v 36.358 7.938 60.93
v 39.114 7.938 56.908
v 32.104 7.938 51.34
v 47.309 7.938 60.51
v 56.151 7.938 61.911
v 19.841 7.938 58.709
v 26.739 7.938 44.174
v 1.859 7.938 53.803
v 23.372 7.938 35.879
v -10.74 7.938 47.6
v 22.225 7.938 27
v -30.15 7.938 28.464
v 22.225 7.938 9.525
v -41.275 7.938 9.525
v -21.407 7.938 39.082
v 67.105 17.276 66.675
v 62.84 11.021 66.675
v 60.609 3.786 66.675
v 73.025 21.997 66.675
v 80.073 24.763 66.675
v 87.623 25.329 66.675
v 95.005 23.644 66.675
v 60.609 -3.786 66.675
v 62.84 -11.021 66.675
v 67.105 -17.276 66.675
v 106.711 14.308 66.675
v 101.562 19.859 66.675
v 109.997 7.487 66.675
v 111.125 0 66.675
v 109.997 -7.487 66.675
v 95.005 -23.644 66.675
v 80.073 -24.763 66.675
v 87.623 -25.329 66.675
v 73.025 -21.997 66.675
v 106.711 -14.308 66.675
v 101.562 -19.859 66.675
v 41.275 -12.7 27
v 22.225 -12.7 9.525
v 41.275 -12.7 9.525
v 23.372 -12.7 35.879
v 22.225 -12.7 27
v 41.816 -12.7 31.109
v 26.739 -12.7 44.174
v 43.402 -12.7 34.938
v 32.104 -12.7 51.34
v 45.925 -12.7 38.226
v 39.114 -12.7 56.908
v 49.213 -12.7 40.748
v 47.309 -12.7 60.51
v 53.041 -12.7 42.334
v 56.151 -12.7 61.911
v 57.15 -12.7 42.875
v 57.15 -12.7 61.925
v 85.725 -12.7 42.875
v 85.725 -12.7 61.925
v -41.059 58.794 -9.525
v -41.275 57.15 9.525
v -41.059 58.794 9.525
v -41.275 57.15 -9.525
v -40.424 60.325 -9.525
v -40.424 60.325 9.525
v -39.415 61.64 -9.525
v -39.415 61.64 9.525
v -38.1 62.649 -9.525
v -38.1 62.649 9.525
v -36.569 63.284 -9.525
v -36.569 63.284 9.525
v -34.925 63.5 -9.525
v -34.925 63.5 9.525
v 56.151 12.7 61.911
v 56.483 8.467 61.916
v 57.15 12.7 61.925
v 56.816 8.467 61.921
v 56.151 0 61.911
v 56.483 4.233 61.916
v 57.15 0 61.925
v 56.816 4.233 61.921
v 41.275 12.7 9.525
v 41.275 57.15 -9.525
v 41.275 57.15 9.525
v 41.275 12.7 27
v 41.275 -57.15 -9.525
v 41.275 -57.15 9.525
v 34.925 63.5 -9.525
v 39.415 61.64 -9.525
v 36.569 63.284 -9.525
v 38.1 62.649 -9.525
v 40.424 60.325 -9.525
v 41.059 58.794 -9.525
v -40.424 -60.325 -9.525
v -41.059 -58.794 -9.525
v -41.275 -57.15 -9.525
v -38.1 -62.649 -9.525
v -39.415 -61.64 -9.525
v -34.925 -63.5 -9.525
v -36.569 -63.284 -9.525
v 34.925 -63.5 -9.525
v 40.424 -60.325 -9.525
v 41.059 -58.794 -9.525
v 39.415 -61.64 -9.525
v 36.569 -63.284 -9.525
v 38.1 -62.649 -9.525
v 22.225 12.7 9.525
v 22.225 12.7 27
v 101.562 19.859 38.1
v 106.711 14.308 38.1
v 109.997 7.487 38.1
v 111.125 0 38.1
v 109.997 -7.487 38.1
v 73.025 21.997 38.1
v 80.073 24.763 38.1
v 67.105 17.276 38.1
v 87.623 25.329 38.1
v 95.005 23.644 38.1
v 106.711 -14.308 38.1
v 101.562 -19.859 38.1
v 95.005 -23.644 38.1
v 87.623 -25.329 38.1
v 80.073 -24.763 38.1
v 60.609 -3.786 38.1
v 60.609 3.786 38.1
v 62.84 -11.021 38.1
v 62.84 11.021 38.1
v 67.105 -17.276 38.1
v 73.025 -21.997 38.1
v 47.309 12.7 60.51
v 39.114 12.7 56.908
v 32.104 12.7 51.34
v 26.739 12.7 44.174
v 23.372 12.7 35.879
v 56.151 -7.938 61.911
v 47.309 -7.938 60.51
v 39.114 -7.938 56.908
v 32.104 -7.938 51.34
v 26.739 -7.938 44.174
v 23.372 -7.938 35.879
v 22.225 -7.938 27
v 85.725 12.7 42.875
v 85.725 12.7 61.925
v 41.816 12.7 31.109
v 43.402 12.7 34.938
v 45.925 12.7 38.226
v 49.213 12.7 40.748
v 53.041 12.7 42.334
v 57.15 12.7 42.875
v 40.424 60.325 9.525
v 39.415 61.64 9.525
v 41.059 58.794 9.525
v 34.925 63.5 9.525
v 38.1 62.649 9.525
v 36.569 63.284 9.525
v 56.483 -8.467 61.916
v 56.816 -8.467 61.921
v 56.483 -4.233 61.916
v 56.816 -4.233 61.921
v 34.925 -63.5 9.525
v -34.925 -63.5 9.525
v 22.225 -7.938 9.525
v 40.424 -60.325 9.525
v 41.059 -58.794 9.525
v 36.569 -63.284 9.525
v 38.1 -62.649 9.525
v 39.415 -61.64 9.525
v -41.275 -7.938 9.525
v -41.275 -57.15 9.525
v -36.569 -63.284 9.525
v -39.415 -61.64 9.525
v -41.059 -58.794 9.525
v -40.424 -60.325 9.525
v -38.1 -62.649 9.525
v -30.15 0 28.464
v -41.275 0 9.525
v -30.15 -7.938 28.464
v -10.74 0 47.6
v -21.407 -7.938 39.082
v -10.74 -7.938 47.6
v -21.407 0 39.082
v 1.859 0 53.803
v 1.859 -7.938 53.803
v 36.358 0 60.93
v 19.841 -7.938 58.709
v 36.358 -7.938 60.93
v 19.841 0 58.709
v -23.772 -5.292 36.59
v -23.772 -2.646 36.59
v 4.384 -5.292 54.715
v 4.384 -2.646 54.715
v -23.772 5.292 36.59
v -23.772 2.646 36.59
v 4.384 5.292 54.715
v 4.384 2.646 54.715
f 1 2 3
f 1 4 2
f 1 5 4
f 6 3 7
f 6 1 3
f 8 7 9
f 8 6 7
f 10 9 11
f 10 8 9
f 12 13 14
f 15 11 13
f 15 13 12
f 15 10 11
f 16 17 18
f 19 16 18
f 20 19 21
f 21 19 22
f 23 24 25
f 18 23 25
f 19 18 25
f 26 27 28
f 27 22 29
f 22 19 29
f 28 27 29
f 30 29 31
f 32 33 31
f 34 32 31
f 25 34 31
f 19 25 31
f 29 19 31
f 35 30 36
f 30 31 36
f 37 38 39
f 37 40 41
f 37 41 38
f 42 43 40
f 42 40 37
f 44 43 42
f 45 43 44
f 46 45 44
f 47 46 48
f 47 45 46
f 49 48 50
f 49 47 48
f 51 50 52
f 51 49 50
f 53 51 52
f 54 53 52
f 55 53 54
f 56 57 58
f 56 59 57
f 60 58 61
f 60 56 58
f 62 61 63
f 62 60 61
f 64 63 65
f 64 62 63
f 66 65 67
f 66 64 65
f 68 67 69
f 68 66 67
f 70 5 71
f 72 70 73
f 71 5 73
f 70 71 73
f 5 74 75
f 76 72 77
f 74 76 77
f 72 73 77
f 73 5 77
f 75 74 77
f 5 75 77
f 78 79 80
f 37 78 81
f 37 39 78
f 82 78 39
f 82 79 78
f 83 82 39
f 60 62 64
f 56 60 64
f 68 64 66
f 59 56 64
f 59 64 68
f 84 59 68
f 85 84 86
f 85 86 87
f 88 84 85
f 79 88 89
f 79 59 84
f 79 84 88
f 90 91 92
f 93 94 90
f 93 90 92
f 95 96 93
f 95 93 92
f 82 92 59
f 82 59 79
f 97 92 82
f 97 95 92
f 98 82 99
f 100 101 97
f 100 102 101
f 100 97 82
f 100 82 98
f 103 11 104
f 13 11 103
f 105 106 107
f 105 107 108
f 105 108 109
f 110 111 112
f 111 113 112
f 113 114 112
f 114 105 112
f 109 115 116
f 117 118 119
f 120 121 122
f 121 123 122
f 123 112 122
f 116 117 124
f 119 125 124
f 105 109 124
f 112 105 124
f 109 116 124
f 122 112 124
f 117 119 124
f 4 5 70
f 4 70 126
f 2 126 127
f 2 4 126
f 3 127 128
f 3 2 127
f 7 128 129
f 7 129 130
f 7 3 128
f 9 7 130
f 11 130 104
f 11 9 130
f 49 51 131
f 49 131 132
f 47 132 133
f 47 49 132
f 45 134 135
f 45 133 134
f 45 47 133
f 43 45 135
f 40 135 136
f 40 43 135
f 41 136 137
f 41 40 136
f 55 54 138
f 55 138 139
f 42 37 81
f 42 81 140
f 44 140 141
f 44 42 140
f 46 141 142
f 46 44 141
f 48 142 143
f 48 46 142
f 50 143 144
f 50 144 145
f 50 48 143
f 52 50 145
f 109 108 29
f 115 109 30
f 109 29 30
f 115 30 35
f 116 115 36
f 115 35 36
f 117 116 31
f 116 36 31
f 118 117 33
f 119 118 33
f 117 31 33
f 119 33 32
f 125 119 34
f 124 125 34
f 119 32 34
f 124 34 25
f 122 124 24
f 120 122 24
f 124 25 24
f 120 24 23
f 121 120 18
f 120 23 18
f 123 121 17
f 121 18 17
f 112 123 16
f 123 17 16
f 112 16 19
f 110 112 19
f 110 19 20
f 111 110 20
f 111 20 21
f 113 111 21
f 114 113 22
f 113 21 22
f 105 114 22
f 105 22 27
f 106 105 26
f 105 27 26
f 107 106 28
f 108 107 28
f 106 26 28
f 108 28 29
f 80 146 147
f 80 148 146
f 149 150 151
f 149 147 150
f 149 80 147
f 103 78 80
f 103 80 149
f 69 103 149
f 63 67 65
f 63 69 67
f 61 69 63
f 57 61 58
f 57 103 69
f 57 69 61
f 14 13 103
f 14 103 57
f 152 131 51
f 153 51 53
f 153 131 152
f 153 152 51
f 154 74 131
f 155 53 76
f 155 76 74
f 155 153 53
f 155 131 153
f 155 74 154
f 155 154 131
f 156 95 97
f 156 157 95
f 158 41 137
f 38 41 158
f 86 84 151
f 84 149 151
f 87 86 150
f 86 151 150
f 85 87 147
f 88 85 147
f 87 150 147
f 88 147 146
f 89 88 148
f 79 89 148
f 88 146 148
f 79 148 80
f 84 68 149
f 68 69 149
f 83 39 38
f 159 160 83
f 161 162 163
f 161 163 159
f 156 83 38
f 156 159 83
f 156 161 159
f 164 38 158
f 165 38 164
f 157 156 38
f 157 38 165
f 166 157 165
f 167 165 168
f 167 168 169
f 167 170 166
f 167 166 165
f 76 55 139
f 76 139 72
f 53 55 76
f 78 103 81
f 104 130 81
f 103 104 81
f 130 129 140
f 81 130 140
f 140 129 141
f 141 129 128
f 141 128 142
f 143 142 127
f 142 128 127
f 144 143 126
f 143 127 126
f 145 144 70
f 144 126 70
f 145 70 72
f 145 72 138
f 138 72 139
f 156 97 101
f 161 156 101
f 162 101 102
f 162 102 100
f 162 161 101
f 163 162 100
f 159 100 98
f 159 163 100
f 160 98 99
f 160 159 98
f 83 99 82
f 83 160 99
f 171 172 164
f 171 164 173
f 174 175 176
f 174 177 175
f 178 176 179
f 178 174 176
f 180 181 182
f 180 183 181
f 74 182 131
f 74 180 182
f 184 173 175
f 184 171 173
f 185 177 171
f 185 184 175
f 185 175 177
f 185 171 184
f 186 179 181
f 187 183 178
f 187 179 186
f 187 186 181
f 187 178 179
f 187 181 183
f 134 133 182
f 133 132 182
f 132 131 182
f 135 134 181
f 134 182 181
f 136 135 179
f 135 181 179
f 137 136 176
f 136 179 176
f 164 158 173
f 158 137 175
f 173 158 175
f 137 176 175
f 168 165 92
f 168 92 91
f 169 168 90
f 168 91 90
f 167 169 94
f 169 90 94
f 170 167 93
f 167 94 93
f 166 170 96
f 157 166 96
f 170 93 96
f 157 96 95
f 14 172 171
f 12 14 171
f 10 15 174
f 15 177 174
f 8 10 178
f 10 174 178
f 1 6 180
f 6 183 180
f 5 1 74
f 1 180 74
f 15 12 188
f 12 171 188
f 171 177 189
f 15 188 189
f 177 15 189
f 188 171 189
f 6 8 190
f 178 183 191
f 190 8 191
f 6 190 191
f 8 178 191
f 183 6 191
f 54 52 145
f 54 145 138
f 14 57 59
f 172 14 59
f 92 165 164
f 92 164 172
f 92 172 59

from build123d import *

# Parameters (mm, degrees)
F1_DEPTH = 63.5
F0_W     = 25.4
F0_H     = 19.05
F2_DEPTH = 12.7
F3_DEPTH = 7.9375
F5_R     = 6.35


with BuildPart() as f1:
    # F0 (on Front) → F1 (new body, symmetric)
    with BuildSketch(Plane.XZ):
        Polygon((-41.275, -9.525), (41.275, -9.525), (41.275, 9.525), (22.225, 9.525), (-41.275, 9.525), align=None)
    extrude(amount=F1_DEPTH, both=True)

    # F0 (on Front) → F2 (join, symmetric)
    with BuildSketch(Plane.XZ):
        with BuildLine():
            Line((22.225, 9.525), (41.275, 9.525))
            Line((41.275, 9.525), (41.275, 27.0002))
            ThreePointArc((41.275, 27.0002), (45.92468, 38.22552), (57.15, 42.8752))
            Line((57.15, 42.8752), (60.325, 42.8752))
            Line((60.325, 42.8752), (60.325, 61.9252))
            Line((60.325, 61.9252), (57.15, 61.9252))
            add(Edge.make_bspline(
                [(56.151356, 61.910919), (56.482927, 61.916142), (56.815806, 61.920903), (57.15, 61.9252)],
                knots=[110.96262, 110.96262, 110.96262, 110.96262, 111.504536, 111.504536, 111.504536, 111.504536], degree=3))
            ThreePointArc((56.151356, 61.910919), (32.10371, 51.34027), (22.225, 27.0002))
            Line((22.225, 27.0002), (22.225, 9.525))
        make_face()
        with Locations((73.025, 52.4002)):
            Rectangle(F0_W, F0_H)
    extrude(amount=F2_DEPTH, both=True)

    # F0 (on Front) → F3 (join, symmetric)
    with BuildSketch(Plane.XZ):
        with BuildLine():
            add(Edge.make_bspline(
                [(-41.275, 9.525), (-24.779373, 40.398362), (-11.740939, 60.84154), (56.151356, 61.910919)],
                knots=[0, 0, 0, 0, 110.96262, 110.96262, 110.96262, 110.96262], degree=3))
            Line((-41.275, 9.525), (22.225, 9.525))
            Line((22.225, 9.525), (22.225, 27.0002))
            ThreePointArc((22.225, 27.0002), (32.10371, 51.34027), (56.151356, 61.910919))
        make_face()
    extrude(amount=F3_DEPTH, both=True)

    # F5
    f5_edges = [f1.edges().sort_by_distance(p)[0] for p in [
        (41.275, -63.5, 0),
        (-41.275, -63.5, 0),
        (41.275, 63.5, 0),
        (-41.275, 63.5, 0),
    ]]
    fillet(f5_edges, radius=F5_R)


with BuildPart() as f4:
    # F0 (on Front) → F4 (revolve)
    with BuildSketch(Plane.XZ):
        Polygon((85.725, 61.9252), (85.725, 42.8752), (85.725, 38.1), (111.125, 38.1), (111.125, 66.675), (85.725, 66.675), align=None)
    revolve(axis=Axis((85.725, 0, 52.4002), (0, 0, -1)))


solid = Compound([f1.part, f4.part])
